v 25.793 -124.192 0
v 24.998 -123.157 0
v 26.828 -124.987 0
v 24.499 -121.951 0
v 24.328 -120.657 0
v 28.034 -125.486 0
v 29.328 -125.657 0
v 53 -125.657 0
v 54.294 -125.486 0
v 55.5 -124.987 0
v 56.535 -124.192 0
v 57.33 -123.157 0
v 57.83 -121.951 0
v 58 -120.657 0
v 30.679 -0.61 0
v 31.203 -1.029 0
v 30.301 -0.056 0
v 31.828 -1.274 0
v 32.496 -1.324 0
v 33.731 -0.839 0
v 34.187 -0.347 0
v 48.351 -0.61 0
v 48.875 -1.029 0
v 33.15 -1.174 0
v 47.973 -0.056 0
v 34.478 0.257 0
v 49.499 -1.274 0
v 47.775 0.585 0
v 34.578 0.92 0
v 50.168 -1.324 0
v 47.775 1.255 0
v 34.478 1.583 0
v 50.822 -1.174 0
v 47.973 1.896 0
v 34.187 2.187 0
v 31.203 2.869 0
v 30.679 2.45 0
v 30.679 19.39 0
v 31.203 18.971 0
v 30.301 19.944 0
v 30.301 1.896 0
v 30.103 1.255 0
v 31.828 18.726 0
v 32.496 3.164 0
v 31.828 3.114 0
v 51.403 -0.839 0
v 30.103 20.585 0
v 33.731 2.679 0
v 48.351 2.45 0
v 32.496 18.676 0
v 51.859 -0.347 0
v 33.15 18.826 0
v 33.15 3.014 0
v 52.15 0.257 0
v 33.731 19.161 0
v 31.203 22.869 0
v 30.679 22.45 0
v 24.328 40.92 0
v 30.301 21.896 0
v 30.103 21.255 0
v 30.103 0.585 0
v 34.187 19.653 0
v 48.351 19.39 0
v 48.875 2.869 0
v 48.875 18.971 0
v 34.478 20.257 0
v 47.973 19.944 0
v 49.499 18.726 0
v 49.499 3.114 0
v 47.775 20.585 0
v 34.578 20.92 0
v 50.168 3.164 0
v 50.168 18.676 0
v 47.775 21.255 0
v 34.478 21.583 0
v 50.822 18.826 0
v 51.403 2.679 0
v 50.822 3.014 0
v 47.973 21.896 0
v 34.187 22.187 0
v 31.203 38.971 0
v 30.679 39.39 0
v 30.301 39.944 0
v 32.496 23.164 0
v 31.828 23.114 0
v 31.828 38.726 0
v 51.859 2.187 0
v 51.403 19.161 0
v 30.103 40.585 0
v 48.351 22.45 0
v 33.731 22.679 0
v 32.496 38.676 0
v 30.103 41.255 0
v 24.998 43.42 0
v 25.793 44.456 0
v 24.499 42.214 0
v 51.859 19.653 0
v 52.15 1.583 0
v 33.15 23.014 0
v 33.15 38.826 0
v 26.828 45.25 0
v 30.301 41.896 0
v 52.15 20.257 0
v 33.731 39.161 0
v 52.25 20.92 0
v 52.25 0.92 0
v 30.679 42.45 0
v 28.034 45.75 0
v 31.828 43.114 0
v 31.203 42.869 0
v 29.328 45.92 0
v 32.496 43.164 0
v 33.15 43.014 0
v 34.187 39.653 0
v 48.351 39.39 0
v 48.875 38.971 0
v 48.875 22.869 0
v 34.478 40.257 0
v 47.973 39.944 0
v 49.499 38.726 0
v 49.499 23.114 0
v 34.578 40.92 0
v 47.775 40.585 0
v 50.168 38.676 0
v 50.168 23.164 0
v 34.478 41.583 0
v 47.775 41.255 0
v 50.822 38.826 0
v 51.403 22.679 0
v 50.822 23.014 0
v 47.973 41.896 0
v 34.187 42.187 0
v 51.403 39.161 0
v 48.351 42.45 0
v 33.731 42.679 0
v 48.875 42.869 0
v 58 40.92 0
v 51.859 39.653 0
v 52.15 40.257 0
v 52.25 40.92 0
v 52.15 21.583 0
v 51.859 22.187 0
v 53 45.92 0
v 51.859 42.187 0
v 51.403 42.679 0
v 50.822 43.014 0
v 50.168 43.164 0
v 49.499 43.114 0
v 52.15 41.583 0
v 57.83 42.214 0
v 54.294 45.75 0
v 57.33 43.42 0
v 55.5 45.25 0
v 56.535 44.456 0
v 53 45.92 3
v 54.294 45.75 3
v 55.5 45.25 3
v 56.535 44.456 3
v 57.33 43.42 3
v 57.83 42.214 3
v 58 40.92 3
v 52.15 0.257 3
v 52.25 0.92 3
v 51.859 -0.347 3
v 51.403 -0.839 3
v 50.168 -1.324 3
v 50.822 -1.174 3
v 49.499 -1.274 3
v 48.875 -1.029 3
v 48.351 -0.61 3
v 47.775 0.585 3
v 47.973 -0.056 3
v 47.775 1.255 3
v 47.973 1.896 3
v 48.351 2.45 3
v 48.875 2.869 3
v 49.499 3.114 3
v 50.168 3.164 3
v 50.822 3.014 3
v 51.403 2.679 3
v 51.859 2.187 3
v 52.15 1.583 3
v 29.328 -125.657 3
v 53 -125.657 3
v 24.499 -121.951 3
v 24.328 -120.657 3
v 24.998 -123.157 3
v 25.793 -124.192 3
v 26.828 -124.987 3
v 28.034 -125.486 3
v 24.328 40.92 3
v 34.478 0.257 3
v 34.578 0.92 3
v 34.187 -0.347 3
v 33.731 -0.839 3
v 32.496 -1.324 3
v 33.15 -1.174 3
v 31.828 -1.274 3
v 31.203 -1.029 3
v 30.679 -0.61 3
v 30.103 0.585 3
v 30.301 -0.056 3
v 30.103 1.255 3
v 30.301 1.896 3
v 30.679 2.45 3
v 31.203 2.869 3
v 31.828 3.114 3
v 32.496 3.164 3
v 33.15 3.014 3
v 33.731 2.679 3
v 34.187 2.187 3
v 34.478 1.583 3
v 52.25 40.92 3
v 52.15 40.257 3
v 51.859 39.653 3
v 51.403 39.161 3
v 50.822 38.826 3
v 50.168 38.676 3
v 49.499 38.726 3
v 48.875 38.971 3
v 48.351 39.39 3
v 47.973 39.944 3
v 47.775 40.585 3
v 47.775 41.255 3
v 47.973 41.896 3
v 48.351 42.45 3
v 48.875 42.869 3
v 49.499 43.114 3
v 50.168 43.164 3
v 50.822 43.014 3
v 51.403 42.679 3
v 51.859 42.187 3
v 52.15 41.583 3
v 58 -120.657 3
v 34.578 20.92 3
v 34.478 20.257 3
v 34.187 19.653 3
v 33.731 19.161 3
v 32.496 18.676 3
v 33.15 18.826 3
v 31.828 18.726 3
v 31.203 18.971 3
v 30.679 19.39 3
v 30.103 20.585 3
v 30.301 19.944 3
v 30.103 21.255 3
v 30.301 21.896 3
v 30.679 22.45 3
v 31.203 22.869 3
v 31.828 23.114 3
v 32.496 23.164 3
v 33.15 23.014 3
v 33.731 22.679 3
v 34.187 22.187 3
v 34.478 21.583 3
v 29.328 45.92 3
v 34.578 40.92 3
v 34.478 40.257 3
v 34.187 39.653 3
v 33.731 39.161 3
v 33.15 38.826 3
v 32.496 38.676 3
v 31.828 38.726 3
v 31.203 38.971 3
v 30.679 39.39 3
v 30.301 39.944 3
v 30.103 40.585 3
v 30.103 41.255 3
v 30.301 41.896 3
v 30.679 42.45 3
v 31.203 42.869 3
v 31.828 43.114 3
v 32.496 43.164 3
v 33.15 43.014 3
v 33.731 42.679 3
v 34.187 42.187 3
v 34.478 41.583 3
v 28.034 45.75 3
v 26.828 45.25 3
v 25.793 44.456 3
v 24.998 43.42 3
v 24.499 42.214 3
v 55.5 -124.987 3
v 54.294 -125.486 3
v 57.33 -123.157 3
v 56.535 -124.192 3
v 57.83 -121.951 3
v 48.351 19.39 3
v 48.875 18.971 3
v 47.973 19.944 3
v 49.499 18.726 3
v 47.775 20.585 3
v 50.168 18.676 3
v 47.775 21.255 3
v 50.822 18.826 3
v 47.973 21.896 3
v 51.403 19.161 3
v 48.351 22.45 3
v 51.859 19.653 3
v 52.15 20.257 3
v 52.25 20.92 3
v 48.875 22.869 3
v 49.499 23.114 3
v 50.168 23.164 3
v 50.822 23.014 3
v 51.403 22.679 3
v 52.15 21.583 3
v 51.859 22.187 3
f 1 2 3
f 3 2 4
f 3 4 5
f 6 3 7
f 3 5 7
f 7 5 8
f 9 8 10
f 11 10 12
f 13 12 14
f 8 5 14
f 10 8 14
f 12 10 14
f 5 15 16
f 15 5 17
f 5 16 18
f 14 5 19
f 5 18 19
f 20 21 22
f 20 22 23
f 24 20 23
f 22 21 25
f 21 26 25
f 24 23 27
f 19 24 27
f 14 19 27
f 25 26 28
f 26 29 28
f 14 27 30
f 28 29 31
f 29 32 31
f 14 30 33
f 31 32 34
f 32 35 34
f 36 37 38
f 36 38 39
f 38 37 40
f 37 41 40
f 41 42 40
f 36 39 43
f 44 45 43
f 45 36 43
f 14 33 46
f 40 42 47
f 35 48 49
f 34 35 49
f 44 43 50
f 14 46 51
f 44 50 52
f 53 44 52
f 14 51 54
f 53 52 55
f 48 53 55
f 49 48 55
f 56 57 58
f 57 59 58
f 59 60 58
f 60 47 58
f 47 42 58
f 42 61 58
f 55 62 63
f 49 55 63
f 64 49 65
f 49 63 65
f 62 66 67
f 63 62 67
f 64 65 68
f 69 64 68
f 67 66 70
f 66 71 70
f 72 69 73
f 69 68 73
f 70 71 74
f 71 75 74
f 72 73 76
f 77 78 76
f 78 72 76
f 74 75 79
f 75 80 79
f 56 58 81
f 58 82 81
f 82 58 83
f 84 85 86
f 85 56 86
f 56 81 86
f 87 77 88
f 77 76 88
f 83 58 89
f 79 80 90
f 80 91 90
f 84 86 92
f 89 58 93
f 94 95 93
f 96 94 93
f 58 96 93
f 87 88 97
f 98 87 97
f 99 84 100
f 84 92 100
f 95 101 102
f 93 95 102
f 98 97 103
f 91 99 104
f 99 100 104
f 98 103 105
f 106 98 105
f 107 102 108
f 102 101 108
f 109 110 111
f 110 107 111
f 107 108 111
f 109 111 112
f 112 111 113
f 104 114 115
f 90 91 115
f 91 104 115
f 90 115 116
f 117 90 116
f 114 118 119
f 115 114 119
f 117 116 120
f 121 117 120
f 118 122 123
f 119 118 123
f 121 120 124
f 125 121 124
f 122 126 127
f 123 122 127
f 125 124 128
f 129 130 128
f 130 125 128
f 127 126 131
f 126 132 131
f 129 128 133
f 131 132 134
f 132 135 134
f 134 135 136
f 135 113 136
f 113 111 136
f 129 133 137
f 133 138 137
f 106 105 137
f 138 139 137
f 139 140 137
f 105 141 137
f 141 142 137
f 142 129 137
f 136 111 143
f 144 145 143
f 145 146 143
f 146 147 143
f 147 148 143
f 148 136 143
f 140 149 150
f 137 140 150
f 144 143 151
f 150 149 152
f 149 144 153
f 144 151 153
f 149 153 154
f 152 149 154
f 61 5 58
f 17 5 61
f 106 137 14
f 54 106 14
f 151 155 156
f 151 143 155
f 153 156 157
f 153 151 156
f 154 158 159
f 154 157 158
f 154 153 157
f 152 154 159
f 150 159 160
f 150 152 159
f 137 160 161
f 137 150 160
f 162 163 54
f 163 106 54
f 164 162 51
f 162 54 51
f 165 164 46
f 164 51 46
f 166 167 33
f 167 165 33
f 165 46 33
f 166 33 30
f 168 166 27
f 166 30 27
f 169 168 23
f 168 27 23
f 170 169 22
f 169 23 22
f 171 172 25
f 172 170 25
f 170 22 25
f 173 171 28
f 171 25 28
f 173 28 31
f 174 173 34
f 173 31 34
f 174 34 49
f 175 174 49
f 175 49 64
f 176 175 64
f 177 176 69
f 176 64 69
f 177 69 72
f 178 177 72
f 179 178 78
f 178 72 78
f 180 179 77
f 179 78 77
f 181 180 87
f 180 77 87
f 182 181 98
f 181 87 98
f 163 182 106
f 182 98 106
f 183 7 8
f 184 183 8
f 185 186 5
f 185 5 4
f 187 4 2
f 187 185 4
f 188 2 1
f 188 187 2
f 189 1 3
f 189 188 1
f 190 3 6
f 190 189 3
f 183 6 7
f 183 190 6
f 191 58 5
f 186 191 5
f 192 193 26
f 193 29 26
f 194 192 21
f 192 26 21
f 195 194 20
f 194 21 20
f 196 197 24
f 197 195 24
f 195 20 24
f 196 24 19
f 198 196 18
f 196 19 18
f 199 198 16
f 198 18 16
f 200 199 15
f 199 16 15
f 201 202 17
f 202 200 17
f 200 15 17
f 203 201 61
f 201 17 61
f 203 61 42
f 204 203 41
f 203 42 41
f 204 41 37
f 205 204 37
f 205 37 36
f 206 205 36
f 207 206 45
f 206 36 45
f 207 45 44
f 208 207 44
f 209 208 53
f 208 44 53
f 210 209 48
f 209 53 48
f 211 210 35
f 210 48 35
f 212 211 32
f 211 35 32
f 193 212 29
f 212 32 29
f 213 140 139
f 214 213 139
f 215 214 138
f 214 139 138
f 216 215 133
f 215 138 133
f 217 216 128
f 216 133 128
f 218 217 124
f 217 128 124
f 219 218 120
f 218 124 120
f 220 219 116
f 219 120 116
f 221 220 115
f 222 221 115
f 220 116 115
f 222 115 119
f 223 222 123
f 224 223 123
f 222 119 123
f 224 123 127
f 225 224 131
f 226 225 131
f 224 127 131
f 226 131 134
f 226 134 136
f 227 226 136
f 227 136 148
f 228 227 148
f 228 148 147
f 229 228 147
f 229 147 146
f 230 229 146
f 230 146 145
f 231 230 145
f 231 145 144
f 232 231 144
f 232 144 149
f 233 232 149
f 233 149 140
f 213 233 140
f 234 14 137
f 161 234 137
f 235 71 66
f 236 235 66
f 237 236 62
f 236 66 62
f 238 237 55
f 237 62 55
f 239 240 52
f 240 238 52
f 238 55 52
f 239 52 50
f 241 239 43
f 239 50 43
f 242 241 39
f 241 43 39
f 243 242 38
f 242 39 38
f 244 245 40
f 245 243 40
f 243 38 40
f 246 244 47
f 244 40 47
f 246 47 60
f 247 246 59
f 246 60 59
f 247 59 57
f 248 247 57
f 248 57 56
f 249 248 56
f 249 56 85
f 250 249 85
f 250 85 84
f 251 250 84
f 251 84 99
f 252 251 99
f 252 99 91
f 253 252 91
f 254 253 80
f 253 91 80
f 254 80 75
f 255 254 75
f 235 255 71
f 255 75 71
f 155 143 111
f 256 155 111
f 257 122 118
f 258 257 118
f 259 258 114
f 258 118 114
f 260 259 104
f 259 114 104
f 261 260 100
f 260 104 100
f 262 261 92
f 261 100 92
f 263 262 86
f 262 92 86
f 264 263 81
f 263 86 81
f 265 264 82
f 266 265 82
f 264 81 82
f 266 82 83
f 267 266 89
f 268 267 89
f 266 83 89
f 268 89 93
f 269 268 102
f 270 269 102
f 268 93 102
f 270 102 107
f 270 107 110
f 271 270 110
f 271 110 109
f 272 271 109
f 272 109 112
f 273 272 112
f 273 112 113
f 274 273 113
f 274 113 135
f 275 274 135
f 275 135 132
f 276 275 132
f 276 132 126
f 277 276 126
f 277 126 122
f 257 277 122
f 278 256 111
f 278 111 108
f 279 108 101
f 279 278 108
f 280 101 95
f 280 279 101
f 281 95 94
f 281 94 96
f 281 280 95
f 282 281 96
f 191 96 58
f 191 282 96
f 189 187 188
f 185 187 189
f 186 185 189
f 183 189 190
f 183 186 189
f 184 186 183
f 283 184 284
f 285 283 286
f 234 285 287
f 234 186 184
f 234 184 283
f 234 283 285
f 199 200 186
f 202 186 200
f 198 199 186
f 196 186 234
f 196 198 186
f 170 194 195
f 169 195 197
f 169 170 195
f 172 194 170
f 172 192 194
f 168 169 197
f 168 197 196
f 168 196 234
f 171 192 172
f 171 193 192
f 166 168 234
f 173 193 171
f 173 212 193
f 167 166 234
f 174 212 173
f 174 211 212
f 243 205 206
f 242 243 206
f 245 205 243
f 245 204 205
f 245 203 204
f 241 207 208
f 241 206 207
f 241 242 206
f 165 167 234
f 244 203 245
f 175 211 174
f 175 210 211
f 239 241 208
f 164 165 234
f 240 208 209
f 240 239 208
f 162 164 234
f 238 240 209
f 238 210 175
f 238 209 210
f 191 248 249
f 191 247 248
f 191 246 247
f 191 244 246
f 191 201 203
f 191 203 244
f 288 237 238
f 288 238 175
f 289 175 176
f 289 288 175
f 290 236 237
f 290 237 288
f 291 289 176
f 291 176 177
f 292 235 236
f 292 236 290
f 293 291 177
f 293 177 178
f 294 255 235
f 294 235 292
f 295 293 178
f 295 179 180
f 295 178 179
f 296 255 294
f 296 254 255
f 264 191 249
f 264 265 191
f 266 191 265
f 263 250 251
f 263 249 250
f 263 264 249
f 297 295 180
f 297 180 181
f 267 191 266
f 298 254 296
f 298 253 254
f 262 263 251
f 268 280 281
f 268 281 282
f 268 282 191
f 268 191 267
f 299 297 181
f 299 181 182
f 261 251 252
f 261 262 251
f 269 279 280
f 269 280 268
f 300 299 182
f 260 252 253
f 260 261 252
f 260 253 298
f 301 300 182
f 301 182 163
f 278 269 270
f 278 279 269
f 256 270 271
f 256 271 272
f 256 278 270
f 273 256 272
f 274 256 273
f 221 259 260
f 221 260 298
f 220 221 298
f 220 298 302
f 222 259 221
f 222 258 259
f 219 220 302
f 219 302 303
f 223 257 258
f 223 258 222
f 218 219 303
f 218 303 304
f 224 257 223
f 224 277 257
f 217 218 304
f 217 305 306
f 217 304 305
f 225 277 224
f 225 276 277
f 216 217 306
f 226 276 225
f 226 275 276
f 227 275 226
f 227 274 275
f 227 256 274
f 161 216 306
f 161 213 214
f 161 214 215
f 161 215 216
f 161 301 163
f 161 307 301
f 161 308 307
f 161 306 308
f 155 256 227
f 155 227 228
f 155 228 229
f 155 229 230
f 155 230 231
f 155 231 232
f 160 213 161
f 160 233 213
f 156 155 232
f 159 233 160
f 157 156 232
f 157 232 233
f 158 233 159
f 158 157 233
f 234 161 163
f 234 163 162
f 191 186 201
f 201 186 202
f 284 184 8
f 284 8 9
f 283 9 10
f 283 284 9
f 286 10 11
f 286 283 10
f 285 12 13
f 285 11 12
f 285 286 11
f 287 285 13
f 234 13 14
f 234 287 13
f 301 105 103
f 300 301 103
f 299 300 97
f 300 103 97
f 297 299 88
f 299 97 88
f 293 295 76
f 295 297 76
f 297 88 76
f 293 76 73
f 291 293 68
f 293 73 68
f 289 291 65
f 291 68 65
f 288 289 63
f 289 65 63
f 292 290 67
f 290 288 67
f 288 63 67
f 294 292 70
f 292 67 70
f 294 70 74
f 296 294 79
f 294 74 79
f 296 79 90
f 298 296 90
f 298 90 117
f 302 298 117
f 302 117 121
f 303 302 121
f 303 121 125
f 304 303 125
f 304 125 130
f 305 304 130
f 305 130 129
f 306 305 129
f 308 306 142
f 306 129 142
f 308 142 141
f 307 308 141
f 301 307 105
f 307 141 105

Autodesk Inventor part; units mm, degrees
ref_plane "YZ Plane" through (0, 0, 0) normal (1, 0, 0) x (0, 1, 0)
ref_plane "XZ Plane" through (0, 0, 0) normal (0, 1, 0) x (-1, 0, 0)
ref_plane "XY Plane" through (0, 0, 0) normal (0, 0, 1) x (1, 0, 0)
sketch "Block1" plane through (0, 0, 0) normal (0, 0, 1) x (1, 0, 0)
  line L0 (22.2625, 0.2735) -> (22.2625, -13.7265)
  line L1 (56.7335, -13.7265) -> (22.2625, -13.7265)
  circle A0 centre (36.0618, -8.7265) radius 2.25
  circle A1 centre (53.7335, -8.7265) radius 2.25
  line L2 (61.7335, 0.2735) -> (61.7335, -8.7265)
  arc A2 (56.7335, -13.7265) -> (61.7335, -8.7265) centre (56.7335, -8.7265) ccw
  circle A3 centre (53.7335, 11.2735) radius 2.25
  line L3 (61.7335, 20.2735) -> (61.7335, 2.2735)
  circle A4 centre (36.0618, 11.2735) radius 2.25
  line L4 (61.7335, 0.2735) -> (22.2625, 0.2735)
  line L5 (22.2625, 2.2735) -> (61.7335, 2.2735)
  line L6 (22.2625, 20.2735) -> (22.2625, 2.2735)
  line L7 (61.7335, 31.2735) -> (61.7335, 22.2735)
  line L8 (61.7335, 20.2735) -> (22.2625, 20.2735)
  line L9 (22.2625, 22.2735) -> (61.7335, 22.2735)
  circle A5 centre (36.0618, 31.2735) radius 2.25
  line L10 (56.7335, 36.2735) -> (22.2625, 36.2735)
  line L11 (22.2625, 36.2735) -> (22.2625, 22.2735)
  circle A6 centre (53.7335, 31.2735) radius 2.25
  arc A7 (61.7335, 31.2735) -> (56.7335, 36.2735) centre (56.7335, 31.2735) ccw
  point P0 (44.3211, 11.7121)
  point P1 (21.7335, 36.2735)
sketch "Sketch1" plane through (0, 0, 0) normal (0, 0, 1) x (1, 0, 0)
  line L0 (57.9999, 40.92) -> (18.5289, 40.92)
  line L1 (18.5289, 40.92) -> (18.5289, -125.6567)
  line L2 (18.5289, -125.6567) -> (57.9999, -125.6567)
  line L3 (57.9999, -125.6567) -> (57.9999, 40.92)
  line L4 (24.3282, 45.92) -> (24.3282, -125.6567)
  line L5 (18.5289, 9.92) -> (18.5289, -4.08)
  line L6 (52.9999, -4.08) -> (18.5289, -4.08)
  circle A0 centre (32.3282, 0.92) radius 2.25
  circle A1 centre (49.9999, 0.92) radius 2.25
  line L7 (57.9999, 9.92) -> (57.9999, 0.92)
  arc A2 (52.9999, -4.08) -> (57.9999, 0.92) centre (52.9999, 0.92) ccw
  circle A3 centre (49.9999, 20.92) radius 2.25
  line L8 (57.9999, 29.92) -> (57.9999, 11.92)
  circle A4 centre (32.3282, 20.92) radius 2.25
  line L9 (57.9999, 9.92) -> (18.5289, 9.92)
  line L10 (18.5289, 11.92) -> (57.9999, 11.92)
  line L11 (18.5289, 29.92) -> (18.5289, 11.92)
  line L12 (57.9999, 40.92) -> (57.9999, 31.92)
  line L13 (57.9999, 29.92) -> (18.5289, 29.92)
  line L14 (18.5289, 31.92) -> (57.9999, 31.92)
  circle A5 centre (32.3282, 40.92) radius 2.25
  line L15 (52.9999, 45.92) -> (18.5289, 45.92)
  line L16 (18.5289, 45.92) -> (18.5289, 31.92)
  circle A6 centre (49.9999, 40.92) radius 2.25
  arc A7 (57.9999, 40.92) -> (52.9999, 45.92) centre (52.9999, 40.92) ccw
  point P0 (0, 0)
  point P1 (18.5289, 40.92)
  dimension "d3" = 8
  dimension "d4" = 171.5767
extrude "Extrusion1" add sketch "Sketch1" along normal blind 3 contours L3 L14 L4 L0 A5 A6 | L0 A6 A5 L4 L15 A7 | L3 L13 L4 L14 | L3 L10 L4 L13 | L3 L9 L4 L10 | L3 A2 L6 L4 L9 | L3 L2 L4 L6 A2
fillet "Fillet1" radius 5 3 edges at (57.9999, -125.6567, 1.5) (24.3282, -125.6567, 1.5) (24.3282, 45.92, 1.5)
properties part number "Lower Leaf"
